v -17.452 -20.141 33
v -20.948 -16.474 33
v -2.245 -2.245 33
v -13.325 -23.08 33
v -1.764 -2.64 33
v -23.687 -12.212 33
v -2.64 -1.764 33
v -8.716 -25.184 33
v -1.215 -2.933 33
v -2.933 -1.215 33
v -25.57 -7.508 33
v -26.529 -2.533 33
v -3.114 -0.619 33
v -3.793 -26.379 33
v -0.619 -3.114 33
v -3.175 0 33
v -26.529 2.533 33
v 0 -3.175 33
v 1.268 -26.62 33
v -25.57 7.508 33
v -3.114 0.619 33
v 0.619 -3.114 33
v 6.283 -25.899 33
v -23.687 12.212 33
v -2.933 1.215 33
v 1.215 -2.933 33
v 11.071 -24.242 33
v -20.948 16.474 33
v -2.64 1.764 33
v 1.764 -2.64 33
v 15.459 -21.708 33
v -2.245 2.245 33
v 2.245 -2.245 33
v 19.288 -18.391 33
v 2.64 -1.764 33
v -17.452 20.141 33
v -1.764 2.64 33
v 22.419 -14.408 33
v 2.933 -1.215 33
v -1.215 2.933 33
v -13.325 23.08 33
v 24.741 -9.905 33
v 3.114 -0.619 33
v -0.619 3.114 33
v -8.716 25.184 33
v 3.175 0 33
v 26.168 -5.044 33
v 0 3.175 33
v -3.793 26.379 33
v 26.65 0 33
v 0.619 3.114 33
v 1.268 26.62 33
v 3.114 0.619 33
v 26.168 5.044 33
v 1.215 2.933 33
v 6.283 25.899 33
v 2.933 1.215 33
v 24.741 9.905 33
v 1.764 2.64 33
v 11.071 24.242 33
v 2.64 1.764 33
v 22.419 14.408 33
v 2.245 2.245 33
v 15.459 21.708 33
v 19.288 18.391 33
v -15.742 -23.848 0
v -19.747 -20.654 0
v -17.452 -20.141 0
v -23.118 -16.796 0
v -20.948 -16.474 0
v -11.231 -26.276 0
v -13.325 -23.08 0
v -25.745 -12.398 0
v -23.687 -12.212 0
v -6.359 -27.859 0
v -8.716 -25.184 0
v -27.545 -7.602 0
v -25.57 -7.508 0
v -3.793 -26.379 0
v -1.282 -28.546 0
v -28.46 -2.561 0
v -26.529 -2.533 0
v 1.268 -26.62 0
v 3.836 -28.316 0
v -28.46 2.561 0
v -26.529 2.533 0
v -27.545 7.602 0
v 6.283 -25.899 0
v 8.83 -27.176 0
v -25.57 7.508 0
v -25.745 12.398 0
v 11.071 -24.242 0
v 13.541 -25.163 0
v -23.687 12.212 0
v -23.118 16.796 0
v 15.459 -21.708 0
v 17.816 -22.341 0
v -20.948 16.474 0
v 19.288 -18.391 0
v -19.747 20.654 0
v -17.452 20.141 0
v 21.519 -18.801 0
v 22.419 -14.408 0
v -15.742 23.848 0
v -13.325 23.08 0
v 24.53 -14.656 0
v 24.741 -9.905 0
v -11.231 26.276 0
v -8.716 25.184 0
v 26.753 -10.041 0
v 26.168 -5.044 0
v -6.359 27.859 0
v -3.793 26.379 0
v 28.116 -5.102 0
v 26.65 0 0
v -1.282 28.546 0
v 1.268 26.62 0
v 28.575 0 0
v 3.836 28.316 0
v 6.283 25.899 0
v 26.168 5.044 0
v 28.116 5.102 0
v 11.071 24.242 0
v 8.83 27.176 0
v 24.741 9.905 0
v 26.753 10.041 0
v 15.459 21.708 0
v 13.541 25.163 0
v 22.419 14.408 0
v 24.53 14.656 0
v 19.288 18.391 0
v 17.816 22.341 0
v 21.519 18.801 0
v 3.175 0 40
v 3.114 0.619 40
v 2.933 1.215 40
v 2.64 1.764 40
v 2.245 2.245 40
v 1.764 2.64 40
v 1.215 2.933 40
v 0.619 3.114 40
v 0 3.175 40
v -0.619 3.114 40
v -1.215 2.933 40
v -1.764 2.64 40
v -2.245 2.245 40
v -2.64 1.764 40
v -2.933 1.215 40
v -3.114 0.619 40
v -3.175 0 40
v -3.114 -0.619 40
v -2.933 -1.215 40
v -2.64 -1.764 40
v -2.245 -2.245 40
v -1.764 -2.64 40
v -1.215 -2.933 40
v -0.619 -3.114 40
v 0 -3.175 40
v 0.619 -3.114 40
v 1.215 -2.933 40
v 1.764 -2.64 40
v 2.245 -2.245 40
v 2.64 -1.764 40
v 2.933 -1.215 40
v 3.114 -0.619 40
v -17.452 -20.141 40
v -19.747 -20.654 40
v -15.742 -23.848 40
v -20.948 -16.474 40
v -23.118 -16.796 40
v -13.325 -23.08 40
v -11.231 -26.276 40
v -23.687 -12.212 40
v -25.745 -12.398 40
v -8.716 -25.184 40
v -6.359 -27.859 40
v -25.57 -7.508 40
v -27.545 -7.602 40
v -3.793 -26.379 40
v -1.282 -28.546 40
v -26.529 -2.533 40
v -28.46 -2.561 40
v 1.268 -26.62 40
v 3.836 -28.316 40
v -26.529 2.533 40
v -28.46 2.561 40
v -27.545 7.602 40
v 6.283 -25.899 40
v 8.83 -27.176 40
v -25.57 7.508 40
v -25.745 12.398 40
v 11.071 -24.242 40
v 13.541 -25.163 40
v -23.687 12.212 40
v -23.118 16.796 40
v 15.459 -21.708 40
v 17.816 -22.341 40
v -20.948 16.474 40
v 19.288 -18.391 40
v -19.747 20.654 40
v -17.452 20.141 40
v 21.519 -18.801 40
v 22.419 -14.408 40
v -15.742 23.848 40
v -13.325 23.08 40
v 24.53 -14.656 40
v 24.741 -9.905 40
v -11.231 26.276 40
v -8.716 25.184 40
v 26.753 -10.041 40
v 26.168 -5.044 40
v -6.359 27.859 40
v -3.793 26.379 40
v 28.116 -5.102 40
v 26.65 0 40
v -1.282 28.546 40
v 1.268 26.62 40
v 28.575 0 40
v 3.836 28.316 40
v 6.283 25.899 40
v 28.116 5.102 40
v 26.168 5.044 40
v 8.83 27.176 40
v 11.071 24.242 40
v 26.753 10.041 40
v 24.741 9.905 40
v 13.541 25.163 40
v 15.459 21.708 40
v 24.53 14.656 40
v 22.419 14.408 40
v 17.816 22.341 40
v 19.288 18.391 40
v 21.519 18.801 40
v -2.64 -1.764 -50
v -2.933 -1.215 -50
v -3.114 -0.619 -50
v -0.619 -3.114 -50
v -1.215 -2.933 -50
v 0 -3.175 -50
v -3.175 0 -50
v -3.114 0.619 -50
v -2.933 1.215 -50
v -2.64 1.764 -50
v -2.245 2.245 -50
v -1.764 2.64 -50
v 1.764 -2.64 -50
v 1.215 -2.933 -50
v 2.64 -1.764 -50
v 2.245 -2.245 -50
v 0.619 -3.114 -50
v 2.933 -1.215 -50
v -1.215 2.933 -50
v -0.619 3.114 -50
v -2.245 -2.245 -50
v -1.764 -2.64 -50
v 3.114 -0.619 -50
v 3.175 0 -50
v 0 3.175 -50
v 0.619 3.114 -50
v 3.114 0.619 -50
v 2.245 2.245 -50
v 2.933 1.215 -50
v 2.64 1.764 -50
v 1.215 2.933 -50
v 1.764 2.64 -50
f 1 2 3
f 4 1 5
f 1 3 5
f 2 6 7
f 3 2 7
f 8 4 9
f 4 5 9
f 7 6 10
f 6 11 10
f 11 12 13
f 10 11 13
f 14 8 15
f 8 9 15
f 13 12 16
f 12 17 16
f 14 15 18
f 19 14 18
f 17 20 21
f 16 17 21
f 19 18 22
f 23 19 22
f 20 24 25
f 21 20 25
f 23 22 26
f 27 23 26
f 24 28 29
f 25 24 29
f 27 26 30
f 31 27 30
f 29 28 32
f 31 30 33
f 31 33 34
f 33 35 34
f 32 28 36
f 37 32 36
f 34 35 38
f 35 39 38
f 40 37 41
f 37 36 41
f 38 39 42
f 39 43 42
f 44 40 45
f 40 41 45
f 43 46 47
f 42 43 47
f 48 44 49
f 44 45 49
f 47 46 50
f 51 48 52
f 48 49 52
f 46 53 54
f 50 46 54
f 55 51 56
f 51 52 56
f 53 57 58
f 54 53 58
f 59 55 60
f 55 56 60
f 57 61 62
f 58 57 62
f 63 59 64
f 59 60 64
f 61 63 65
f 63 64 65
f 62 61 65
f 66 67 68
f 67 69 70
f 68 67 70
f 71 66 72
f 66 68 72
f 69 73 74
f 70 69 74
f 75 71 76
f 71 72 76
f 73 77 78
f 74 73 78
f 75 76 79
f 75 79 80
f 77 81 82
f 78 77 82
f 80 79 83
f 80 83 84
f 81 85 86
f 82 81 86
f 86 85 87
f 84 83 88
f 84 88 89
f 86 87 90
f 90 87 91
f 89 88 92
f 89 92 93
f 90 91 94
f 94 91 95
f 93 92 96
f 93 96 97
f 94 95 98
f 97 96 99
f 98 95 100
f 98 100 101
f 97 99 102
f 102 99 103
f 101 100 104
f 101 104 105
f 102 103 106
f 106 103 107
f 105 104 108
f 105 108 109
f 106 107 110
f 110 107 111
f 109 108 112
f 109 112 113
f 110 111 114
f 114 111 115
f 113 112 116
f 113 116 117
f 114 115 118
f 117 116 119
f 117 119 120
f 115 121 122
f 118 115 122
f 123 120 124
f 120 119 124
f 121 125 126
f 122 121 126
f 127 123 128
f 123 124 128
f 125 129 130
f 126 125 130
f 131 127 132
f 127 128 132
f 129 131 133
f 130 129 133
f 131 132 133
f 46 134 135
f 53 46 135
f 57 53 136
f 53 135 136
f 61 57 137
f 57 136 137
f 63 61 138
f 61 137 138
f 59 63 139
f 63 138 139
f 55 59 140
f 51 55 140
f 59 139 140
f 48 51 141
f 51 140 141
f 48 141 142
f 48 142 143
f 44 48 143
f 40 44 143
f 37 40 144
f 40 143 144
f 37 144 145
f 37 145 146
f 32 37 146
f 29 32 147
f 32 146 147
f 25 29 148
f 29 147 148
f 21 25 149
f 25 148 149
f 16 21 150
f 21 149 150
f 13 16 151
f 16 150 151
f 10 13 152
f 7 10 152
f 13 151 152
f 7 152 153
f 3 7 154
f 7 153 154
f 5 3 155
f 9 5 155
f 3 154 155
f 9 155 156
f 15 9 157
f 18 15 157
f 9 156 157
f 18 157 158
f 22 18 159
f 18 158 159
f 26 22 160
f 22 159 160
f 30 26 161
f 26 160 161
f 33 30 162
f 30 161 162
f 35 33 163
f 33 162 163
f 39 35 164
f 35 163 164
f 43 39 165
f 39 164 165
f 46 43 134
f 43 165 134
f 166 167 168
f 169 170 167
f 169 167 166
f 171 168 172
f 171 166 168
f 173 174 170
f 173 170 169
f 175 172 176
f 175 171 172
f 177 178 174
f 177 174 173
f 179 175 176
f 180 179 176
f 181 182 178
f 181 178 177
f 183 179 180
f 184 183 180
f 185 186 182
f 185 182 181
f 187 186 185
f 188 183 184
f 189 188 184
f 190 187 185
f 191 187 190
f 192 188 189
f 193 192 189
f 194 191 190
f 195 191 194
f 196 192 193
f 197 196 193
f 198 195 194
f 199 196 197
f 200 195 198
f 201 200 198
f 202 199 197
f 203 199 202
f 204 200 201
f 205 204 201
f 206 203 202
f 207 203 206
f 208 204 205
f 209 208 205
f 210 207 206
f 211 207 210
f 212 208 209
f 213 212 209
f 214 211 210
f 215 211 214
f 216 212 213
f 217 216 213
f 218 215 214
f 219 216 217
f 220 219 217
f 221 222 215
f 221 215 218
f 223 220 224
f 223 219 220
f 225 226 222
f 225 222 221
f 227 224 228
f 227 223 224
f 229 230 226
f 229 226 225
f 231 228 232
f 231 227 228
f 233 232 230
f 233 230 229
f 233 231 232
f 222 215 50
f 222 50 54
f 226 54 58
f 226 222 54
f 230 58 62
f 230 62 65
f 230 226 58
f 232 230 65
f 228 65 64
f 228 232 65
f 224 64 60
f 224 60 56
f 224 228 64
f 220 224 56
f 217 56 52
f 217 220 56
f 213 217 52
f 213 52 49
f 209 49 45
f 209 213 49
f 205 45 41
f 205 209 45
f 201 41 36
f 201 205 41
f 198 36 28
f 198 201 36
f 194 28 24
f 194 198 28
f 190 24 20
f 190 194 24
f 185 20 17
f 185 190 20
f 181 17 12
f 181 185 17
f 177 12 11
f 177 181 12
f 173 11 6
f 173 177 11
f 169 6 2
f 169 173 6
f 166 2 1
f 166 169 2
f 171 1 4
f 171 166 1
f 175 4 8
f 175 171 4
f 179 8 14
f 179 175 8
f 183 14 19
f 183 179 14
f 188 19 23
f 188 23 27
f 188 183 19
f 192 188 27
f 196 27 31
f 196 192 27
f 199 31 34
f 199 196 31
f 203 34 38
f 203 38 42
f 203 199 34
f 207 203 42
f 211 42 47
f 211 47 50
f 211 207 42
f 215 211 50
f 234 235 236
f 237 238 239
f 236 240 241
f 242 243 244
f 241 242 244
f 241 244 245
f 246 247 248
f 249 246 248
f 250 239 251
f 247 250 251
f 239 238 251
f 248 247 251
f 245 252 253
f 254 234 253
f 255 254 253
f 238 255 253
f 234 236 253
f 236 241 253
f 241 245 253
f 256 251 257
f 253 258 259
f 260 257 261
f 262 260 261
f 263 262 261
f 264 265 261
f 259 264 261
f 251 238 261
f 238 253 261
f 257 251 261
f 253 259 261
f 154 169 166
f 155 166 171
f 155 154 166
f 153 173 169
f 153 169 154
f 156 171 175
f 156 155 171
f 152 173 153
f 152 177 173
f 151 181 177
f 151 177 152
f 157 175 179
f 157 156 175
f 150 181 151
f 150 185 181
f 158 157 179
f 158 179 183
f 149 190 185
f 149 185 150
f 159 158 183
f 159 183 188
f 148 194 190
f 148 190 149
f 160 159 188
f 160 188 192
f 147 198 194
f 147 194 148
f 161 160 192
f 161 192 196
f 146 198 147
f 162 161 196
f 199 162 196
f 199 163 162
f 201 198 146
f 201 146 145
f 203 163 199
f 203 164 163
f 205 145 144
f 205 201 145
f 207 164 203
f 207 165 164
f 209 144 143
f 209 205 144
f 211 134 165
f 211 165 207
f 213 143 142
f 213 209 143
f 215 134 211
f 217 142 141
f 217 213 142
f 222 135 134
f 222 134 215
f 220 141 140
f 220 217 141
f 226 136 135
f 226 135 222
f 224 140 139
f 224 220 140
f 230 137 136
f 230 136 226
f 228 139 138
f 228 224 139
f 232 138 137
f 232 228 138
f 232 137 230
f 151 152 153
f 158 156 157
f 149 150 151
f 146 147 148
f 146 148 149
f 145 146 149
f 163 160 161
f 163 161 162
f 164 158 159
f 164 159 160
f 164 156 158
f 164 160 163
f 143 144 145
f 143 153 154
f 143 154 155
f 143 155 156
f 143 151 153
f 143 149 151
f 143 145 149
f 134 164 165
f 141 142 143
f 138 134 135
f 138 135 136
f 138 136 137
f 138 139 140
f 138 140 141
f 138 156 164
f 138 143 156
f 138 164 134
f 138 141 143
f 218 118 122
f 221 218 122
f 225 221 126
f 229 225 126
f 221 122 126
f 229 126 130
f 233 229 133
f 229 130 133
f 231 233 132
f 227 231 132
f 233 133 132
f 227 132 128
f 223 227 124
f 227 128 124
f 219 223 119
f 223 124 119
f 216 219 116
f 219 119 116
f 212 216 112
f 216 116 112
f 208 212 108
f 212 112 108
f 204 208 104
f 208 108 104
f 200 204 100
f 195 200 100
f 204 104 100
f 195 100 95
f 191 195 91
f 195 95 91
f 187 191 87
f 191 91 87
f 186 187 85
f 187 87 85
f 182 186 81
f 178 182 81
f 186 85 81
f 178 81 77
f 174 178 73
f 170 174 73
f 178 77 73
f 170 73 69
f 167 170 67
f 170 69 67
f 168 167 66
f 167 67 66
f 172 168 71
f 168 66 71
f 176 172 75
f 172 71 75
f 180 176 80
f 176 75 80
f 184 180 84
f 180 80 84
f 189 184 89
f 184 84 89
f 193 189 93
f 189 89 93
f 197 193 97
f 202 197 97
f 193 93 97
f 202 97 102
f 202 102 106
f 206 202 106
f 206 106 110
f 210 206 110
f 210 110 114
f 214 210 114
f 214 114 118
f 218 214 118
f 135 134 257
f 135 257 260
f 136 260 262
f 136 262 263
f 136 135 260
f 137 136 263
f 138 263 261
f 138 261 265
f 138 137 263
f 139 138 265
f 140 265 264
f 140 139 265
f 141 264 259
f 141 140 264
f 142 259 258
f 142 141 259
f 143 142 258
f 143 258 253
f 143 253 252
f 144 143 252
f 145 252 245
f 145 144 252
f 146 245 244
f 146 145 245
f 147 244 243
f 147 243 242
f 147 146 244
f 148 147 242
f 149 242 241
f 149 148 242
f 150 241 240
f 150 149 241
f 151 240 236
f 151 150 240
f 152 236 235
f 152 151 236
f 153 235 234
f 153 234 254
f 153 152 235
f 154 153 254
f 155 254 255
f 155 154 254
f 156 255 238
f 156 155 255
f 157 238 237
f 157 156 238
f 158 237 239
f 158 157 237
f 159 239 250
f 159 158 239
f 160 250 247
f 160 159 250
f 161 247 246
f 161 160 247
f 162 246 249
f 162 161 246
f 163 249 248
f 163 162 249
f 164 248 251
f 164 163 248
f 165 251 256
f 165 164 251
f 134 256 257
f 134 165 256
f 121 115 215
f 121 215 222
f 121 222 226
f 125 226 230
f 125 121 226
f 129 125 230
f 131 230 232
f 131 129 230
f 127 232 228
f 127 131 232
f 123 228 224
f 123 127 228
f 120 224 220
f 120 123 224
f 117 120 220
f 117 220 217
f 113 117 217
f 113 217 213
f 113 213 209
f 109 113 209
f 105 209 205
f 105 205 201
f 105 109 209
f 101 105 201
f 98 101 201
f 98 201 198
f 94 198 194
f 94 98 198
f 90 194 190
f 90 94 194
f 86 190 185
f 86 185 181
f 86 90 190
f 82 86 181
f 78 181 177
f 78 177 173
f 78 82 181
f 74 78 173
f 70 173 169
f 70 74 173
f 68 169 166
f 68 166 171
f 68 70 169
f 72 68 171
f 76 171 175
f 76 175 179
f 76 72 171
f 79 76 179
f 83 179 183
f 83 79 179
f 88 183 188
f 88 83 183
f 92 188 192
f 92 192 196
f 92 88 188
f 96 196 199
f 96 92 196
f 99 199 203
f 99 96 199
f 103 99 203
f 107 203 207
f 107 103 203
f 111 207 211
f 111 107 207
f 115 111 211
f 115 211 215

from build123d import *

# Parameters (mm, degrees)
F0_R     = 28.575
F0_R_2   = 26.65
F1_DEPTH = 40
F2_R     = 26.65
F2_R_2   = 3.175
F3_DEPTH = 7
F4_R     = 3.175
F5_DEPTH = 90


with BuildPart() as f1:
    # F0 (on Top) → F1 (new body)
    with BuildSketch(Plane.XY):
        Circle(F0_R)
        Circle(F0_R_2, mode=Mode.SUBTRACT)
    extrude(amount=F1_DEPTH)


with BuildPart() as f3:
    # F2 (on face) → F3 (new body)
    with BuildSketch(Plane.XY.offset(40)):
        Circle(F2_R)
        Circle(F2_R_2, mode=Mode.SUBTRACT)
    extrude(amount=-F3_DEPTH)


with BuildPart() as f5:
    # F4 (on face) → F5 (new body)
    with BuildSketch(Plane.XY.offset(40)):
        Circle(F4_R)
    extrude(amount=-F5_DEPTH)


solid = Compound([f1.part, f3.part, f5.part])
